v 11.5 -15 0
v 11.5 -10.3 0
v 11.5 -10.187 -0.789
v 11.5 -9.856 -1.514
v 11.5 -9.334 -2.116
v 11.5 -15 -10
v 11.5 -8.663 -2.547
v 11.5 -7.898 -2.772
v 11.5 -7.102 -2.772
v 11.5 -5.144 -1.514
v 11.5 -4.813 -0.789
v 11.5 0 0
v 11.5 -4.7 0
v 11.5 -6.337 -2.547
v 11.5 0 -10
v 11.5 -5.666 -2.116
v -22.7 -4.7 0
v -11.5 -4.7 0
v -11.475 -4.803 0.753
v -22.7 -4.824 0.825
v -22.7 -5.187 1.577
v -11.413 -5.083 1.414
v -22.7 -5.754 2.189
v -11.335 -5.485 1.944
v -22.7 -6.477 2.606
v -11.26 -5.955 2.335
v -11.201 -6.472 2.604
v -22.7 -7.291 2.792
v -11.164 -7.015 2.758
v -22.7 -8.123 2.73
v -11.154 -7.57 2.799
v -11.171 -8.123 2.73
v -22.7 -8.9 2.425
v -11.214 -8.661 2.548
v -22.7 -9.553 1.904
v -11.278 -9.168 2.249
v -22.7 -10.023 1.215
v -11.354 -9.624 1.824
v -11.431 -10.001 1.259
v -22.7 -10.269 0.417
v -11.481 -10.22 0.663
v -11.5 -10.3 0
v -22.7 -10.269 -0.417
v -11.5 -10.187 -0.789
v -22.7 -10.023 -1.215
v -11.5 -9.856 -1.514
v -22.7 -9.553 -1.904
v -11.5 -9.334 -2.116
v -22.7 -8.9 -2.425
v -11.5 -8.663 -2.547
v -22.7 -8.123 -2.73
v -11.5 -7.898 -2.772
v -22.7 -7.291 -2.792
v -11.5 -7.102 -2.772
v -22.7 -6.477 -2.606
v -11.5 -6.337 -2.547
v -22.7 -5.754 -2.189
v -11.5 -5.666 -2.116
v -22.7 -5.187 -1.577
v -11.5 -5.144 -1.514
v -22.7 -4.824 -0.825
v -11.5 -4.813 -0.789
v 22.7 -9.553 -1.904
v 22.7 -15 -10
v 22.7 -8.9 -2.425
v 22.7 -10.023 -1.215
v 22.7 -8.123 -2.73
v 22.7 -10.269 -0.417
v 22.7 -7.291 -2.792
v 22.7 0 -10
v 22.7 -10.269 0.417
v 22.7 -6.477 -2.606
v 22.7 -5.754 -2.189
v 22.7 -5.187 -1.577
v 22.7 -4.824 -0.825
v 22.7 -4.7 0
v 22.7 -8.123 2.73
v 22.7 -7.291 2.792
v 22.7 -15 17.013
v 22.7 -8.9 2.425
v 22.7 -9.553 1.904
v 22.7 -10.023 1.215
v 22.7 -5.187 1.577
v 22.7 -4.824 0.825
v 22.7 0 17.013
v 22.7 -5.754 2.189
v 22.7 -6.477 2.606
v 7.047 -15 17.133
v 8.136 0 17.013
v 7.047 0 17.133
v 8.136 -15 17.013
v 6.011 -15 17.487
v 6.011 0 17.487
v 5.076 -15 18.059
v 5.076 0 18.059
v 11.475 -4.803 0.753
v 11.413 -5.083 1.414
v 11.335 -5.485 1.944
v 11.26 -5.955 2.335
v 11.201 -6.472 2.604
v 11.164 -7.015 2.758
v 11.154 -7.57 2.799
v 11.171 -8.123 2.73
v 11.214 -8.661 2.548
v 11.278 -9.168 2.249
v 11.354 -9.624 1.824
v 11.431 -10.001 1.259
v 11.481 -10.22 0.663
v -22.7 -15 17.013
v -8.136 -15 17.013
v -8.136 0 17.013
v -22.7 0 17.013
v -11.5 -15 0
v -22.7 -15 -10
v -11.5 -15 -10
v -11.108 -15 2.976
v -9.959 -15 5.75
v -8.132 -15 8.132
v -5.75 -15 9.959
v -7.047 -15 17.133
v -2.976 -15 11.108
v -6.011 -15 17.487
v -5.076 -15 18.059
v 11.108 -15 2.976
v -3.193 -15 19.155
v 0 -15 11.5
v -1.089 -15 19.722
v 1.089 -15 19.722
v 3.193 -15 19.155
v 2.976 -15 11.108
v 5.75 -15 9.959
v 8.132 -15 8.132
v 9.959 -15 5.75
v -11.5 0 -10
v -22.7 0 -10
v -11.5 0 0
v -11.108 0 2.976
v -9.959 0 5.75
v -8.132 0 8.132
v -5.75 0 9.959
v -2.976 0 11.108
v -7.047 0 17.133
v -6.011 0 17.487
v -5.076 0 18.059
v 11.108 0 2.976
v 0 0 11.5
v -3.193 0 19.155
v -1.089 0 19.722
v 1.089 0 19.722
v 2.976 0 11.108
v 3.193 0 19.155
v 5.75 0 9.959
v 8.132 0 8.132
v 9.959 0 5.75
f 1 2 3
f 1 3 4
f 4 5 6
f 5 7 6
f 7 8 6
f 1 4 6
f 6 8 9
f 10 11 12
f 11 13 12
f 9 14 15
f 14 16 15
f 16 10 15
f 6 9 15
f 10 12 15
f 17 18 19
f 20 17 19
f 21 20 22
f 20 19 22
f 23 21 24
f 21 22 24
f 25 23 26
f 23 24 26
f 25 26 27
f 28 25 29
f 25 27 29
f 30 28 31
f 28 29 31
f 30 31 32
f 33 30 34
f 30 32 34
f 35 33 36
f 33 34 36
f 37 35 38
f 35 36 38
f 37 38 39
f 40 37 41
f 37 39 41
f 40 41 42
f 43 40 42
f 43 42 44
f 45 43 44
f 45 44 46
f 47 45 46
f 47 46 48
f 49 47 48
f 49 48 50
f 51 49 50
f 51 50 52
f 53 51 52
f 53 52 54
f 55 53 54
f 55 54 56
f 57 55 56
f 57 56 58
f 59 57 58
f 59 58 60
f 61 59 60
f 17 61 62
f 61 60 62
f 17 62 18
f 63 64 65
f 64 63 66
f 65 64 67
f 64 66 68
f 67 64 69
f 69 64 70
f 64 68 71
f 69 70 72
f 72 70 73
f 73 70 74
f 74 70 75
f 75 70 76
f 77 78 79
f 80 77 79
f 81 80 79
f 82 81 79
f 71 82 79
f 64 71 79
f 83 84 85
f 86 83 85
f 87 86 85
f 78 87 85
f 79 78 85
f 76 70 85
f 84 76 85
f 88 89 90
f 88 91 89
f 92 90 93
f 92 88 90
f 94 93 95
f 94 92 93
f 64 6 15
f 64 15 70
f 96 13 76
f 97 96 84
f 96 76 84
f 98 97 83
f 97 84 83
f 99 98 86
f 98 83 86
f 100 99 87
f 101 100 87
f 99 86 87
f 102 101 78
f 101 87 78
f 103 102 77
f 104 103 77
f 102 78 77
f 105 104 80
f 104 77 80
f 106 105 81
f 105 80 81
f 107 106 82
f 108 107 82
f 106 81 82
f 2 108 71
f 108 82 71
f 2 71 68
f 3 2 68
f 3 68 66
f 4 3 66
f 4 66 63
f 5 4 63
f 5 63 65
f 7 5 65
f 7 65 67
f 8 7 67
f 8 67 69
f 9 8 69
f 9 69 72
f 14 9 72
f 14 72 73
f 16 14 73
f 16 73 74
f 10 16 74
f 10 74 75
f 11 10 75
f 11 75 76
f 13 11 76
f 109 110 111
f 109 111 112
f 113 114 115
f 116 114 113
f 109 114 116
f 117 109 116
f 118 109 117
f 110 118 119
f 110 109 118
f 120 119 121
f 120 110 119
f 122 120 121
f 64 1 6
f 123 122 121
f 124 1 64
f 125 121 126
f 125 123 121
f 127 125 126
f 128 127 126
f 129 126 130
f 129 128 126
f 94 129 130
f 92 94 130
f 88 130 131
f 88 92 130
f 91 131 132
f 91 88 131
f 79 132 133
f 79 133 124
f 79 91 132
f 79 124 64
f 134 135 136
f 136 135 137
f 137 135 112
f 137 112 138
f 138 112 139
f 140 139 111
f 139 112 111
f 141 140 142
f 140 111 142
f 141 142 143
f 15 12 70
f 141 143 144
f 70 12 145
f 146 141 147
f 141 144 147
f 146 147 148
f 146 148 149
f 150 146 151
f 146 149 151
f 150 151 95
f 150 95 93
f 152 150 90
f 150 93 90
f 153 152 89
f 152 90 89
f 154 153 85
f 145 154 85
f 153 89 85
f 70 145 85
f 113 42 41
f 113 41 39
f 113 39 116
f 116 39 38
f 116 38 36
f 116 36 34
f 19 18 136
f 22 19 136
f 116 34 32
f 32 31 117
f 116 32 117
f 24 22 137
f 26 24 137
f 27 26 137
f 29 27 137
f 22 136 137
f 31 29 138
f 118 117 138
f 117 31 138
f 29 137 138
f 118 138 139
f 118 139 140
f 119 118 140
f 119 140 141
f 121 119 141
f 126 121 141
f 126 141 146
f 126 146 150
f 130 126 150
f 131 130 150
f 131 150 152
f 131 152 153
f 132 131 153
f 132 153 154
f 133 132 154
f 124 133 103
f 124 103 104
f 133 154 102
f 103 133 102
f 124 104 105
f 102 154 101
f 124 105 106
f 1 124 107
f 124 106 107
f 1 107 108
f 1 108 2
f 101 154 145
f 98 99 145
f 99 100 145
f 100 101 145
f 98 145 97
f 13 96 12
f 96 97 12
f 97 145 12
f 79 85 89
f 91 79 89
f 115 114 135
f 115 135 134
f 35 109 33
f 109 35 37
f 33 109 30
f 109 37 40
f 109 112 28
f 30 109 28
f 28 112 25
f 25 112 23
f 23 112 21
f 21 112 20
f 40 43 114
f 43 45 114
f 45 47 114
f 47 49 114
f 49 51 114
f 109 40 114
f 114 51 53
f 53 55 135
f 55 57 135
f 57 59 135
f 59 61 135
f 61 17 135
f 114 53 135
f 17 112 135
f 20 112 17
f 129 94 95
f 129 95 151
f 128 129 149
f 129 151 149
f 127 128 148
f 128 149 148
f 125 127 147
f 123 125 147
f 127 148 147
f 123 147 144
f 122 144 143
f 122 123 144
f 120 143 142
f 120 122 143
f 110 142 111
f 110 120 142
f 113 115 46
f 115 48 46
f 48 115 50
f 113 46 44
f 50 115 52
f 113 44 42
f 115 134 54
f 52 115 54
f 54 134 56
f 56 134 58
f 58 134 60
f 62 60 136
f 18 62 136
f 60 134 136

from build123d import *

# Parameters (mm, degrees)
F1_DEPTH = 15
F2_R     = 2.8
F3_DEPTH = 45.401
F4_R     = 5


with BuildPart() as f1:
    # F0 (on Front) → F1 (new body)
    with BuildSketch(Plane.XZ):
        with BuildLine():
            ThreePointArc((-11.5, 0), (0, 11.5), (11.5, 0))
            Line((11.5, 0), (11.5, -10))
            Line((11.5, -10), (22.7, -10))
            Line((22.7, -10), (22.7, 0))
            Line((22.7, 0), (22.7, 17.013083))
            Line((22.7, 17.013083), (6.196252, 17.013083))
            ThreePointArc((6.196252, 17.013083), (0, 19.79383), (-6.196252, 17.013083))
            Line((-6.196252, 17.013083), (-22.7, 17.013083))
            Line((-22.7, 17.013083), (-22.7, 0))
            Line((-22.7, 0), (-22.7, -10))
            Line((-22.7, -10), (-11.5, -10))
            Line((-11.5, -10), (-11.5, 0))
        make_face()
    extrude(amount=F1_DEPTH)

    # F2 (on face) → F3 (cut, through all)
    with BuildSketch(Plane.YZ.offset(22.7)):
        with Locations((-7.5, 0)):
            Circle(F2_R)
    extrude(amount=-F3_DEPTH, mode=Mode.SUBTRACT)

    # F4
    f4_edges = [f1.edges().sort_by_distance(p)[0] for p in [
        (6.196252, -7.5, 17.013083),
        (-6.196252, -7.5, 17.013083),
    ]]
    fillet(f4_edges, radius=F4_R)


solid = f1.part
